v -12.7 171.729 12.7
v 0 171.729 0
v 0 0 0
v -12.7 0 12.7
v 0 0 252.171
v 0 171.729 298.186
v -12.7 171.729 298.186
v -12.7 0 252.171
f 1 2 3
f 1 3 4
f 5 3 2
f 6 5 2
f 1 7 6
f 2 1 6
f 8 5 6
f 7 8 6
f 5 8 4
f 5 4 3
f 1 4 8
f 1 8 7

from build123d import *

# Parameters (mm, degrees)
SKETCH2_W           = 12.7
SKETCH2_H           = 171.7294
BOSS_EXTRUDE2_DEPTH = 381
CUT_EXTRUDE1_DEPTH  = 13.7
CUT_EXTRUDE2_DEPTH  = 172.7294


with BuildPart() as part:
    # Sketch2 → Boss-Extrude2 (new body)
    with BuildSketch(Plane.XY):
        with Locations((-6.35, 85.8647)):
            Rectangle(SKETCH2_W, SKETCH2_H)
    extrude(amount=BOSS_EXTRUDE2_DEPTH)

    # Sketch3 → Cut-Extrude1 (cut, through all)
    with BuildSketch(Plane(origin=(0, 0, 0), x_dir=(0, 0, -1), z_dir=(1, 0, 0))):
        Polygon((-252.1712, 0), (-298.185954047, 171.7294), (-381, 171.7294), (-381, 0), align=None)
    extrude(amount=-CUT_EXTRUDE1_DEPTH, mode=Mode.SUBTRACT)

    # Sketch4 → Cut-Extrude2 (cut, through all)
    with BuildSketch(Plane(origin=(0, 171.7294, 0), x_dir=(1, 0, 0), z_dir=(0, 1, 0))):
        Polygon((0, 0), (-12.7, -12.7), (-12.7, 0), align=None)
    extrude(amount=-CUT_EXTRUDE2_DEPTH, mode=Mode.SUBTRACT)


solid = part.part
